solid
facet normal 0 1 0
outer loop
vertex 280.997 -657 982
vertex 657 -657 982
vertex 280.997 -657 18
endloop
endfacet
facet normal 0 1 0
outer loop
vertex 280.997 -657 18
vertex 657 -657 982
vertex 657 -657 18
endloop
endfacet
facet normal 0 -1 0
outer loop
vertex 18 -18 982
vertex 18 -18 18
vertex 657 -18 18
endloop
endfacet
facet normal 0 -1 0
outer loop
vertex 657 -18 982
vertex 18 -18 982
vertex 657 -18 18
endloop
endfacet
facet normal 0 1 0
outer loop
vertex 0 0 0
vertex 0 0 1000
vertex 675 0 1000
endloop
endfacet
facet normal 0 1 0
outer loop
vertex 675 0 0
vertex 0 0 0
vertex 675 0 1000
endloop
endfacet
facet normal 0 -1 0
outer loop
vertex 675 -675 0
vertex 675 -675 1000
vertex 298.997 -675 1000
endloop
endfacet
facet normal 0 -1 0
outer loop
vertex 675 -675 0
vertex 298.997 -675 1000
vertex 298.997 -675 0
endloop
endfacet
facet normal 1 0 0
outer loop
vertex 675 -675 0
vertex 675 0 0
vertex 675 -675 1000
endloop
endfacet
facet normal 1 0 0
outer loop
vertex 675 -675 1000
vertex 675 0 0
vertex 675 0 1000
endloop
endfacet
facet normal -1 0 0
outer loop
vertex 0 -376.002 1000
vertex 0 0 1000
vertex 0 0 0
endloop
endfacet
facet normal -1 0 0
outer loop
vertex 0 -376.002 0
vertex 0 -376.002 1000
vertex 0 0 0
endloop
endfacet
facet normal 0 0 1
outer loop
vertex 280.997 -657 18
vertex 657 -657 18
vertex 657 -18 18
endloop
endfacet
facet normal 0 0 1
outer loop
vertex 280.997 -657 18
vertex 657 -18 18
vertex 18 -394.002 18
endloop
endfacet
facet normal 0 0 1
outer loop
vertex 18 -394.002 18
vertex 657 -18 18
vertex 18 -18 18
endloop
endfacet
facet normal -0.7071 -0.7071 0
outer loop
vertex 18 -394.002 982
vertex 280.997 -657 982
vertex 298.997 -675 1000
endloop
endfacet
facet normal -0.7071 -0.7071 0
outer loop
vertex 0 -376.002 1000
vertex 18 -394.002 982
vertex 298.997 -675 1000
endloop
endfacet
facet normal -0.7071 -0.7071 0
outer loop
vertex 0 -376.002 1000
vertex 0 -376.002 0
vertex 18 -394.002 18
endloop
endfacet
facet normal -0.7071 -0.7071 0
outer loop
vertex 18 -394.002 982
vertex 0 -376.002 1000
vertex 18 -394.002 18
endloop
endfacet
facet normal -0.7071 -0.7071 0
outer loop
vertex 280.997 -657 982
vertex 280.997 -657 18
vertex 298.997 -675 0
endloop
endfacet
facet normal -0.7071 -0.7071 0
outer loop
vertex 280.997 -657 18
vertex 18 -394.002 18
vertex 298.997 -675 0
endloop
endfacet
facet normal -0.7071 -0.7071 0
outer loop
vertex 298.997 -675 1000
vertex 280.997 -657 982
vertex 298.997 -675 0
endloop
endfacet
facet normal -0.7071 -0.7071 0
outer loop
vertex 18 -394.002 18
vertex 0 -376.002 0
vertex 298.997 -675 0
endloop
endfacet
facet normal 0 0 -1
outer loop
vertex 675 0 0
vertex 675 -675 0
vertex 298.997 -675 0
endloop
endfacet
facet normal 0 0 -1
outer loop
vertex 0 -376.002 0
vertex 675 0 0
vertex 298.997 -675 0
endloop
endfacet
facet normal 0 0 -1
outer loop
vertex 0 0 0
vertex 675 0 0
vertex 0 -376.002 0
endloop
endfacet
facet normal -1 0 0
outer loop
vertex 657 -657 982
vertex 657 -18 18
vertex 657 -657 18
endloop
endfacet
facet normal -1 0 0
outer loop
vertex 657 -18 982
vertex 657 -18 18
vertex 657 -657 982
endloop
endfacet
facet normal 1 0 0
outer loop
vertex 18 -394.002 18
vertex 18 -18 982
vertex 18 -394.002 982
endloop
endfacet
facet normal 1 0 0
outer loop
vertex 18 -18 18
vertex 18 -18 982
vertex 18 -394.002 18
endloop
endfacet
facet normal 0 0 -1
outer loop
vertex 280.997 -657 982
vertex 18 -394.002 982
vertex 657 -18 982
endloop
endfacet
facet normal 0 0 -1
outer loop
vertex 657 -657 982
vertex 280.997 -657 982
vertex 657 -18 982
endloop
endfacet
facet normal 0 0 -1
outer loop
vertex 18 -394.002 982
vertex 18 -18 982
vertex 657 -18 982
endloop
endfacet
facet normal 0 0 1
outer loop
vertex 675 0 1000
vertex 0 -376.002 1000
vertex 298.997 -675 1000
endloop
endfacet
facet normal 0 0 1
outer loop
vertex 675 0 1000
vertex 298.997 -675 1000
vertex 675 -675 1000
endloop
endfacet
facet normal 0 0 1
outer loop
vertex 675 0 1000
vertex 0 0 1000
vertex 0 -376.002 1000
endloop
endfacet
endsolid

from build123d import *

# Parameters (mm, degrees)
F0_W      = 82.2246223688
F0_H      = 71.0700303316
F1_DEPTH  = 1000
F2_DEPTH  = 675
F3_DEPTH  = 675
F4_W      = 383.3865523338
F4_H      = 348.4983026981
F5_DEPTH  = 25
F6_DEPTH  = 84.39
F7_DEPTH  = 49.5
F9_DEPTH  = 25
F10_DEPTH = 975
F11_T     = -18


with BuildPart() as f1:
    # F0 (on Top) → F1 (new body)
    with BuildSketch(Plane.XY):
        with Locations((41.1123111844, -35.5350151658)):
            Rectangle(F0_W, F0_H)
    extrude(amount=F1_DEPTH)

    # F2 (add): a face of the model
    f2_faces = [f1.faces().sort_by_distance(p)[0] for p in [
        (0, -35.5350151658, 500),
    ]]
    extrude(f2_faces, amount=-F2_DEPTH)

    # F3 (add): a face of the model
    f3_faces = [f1.faces().sort_by_distance(p)[0] for p in [
        (337.5, 0, 500),
    ]]
    extrude(f3_faces, amount=-F3_DEPTH)

    # F4 (on face) → F5 (cut)
    with BuildSketch(Plane.XY.offset(1000)):
        with Locations((191.6932761669, -500.7508486509)):
            Rectangle(F4_W, F4_H)
    extrude(amount=-F5_DEPTH, mode=Mode.SUBTRACT)

    # F6 (add): a face of the model
    f6_faces = [f1.faces().sort_by_distance(p)[0] for p in [
        (383.3865523338, -500.7508486509, 987.5),
    ]]
    extrude(f6_faces, amount=F6_DEPTH)

    # F7 (add): a face of the model
    f7_faces = [f1.faces().sort_by_distance(p)[0] for p in [
        (149.4982761669, -326.5016973019, 987.5),
    ]]
    extrude(f7_faces, amount=F7_DEPTH)

    # F8 (on face) → F9 (join)
    with BuildSketch(Plane.XY.offset(975)):
        Polygon((0, -376.0016973019), (298.9965523338, -675), (298.9965523338, -376.0016973019), align=None)
    extrude(amount=F9_DEPTH)

    # F10 (cut): a face of the model
    f10_faces = [f1.faces().sort_by_distance(p)[0] for p in [
        (99.6655174446, -575.3338991006, 975),
    ]]
    extrude(f10_faces, amount=-F10_DEPTH, mode=Mode.SUBTRACT)

    # F11
    f11_openings = [f1.faces().sort_by_distance(p)[0] for p in [
        (149.498276, -525.500849, 500),
    ]]
    offset(amount=F11_T, openings=f11_openings)


solid = f1.part
